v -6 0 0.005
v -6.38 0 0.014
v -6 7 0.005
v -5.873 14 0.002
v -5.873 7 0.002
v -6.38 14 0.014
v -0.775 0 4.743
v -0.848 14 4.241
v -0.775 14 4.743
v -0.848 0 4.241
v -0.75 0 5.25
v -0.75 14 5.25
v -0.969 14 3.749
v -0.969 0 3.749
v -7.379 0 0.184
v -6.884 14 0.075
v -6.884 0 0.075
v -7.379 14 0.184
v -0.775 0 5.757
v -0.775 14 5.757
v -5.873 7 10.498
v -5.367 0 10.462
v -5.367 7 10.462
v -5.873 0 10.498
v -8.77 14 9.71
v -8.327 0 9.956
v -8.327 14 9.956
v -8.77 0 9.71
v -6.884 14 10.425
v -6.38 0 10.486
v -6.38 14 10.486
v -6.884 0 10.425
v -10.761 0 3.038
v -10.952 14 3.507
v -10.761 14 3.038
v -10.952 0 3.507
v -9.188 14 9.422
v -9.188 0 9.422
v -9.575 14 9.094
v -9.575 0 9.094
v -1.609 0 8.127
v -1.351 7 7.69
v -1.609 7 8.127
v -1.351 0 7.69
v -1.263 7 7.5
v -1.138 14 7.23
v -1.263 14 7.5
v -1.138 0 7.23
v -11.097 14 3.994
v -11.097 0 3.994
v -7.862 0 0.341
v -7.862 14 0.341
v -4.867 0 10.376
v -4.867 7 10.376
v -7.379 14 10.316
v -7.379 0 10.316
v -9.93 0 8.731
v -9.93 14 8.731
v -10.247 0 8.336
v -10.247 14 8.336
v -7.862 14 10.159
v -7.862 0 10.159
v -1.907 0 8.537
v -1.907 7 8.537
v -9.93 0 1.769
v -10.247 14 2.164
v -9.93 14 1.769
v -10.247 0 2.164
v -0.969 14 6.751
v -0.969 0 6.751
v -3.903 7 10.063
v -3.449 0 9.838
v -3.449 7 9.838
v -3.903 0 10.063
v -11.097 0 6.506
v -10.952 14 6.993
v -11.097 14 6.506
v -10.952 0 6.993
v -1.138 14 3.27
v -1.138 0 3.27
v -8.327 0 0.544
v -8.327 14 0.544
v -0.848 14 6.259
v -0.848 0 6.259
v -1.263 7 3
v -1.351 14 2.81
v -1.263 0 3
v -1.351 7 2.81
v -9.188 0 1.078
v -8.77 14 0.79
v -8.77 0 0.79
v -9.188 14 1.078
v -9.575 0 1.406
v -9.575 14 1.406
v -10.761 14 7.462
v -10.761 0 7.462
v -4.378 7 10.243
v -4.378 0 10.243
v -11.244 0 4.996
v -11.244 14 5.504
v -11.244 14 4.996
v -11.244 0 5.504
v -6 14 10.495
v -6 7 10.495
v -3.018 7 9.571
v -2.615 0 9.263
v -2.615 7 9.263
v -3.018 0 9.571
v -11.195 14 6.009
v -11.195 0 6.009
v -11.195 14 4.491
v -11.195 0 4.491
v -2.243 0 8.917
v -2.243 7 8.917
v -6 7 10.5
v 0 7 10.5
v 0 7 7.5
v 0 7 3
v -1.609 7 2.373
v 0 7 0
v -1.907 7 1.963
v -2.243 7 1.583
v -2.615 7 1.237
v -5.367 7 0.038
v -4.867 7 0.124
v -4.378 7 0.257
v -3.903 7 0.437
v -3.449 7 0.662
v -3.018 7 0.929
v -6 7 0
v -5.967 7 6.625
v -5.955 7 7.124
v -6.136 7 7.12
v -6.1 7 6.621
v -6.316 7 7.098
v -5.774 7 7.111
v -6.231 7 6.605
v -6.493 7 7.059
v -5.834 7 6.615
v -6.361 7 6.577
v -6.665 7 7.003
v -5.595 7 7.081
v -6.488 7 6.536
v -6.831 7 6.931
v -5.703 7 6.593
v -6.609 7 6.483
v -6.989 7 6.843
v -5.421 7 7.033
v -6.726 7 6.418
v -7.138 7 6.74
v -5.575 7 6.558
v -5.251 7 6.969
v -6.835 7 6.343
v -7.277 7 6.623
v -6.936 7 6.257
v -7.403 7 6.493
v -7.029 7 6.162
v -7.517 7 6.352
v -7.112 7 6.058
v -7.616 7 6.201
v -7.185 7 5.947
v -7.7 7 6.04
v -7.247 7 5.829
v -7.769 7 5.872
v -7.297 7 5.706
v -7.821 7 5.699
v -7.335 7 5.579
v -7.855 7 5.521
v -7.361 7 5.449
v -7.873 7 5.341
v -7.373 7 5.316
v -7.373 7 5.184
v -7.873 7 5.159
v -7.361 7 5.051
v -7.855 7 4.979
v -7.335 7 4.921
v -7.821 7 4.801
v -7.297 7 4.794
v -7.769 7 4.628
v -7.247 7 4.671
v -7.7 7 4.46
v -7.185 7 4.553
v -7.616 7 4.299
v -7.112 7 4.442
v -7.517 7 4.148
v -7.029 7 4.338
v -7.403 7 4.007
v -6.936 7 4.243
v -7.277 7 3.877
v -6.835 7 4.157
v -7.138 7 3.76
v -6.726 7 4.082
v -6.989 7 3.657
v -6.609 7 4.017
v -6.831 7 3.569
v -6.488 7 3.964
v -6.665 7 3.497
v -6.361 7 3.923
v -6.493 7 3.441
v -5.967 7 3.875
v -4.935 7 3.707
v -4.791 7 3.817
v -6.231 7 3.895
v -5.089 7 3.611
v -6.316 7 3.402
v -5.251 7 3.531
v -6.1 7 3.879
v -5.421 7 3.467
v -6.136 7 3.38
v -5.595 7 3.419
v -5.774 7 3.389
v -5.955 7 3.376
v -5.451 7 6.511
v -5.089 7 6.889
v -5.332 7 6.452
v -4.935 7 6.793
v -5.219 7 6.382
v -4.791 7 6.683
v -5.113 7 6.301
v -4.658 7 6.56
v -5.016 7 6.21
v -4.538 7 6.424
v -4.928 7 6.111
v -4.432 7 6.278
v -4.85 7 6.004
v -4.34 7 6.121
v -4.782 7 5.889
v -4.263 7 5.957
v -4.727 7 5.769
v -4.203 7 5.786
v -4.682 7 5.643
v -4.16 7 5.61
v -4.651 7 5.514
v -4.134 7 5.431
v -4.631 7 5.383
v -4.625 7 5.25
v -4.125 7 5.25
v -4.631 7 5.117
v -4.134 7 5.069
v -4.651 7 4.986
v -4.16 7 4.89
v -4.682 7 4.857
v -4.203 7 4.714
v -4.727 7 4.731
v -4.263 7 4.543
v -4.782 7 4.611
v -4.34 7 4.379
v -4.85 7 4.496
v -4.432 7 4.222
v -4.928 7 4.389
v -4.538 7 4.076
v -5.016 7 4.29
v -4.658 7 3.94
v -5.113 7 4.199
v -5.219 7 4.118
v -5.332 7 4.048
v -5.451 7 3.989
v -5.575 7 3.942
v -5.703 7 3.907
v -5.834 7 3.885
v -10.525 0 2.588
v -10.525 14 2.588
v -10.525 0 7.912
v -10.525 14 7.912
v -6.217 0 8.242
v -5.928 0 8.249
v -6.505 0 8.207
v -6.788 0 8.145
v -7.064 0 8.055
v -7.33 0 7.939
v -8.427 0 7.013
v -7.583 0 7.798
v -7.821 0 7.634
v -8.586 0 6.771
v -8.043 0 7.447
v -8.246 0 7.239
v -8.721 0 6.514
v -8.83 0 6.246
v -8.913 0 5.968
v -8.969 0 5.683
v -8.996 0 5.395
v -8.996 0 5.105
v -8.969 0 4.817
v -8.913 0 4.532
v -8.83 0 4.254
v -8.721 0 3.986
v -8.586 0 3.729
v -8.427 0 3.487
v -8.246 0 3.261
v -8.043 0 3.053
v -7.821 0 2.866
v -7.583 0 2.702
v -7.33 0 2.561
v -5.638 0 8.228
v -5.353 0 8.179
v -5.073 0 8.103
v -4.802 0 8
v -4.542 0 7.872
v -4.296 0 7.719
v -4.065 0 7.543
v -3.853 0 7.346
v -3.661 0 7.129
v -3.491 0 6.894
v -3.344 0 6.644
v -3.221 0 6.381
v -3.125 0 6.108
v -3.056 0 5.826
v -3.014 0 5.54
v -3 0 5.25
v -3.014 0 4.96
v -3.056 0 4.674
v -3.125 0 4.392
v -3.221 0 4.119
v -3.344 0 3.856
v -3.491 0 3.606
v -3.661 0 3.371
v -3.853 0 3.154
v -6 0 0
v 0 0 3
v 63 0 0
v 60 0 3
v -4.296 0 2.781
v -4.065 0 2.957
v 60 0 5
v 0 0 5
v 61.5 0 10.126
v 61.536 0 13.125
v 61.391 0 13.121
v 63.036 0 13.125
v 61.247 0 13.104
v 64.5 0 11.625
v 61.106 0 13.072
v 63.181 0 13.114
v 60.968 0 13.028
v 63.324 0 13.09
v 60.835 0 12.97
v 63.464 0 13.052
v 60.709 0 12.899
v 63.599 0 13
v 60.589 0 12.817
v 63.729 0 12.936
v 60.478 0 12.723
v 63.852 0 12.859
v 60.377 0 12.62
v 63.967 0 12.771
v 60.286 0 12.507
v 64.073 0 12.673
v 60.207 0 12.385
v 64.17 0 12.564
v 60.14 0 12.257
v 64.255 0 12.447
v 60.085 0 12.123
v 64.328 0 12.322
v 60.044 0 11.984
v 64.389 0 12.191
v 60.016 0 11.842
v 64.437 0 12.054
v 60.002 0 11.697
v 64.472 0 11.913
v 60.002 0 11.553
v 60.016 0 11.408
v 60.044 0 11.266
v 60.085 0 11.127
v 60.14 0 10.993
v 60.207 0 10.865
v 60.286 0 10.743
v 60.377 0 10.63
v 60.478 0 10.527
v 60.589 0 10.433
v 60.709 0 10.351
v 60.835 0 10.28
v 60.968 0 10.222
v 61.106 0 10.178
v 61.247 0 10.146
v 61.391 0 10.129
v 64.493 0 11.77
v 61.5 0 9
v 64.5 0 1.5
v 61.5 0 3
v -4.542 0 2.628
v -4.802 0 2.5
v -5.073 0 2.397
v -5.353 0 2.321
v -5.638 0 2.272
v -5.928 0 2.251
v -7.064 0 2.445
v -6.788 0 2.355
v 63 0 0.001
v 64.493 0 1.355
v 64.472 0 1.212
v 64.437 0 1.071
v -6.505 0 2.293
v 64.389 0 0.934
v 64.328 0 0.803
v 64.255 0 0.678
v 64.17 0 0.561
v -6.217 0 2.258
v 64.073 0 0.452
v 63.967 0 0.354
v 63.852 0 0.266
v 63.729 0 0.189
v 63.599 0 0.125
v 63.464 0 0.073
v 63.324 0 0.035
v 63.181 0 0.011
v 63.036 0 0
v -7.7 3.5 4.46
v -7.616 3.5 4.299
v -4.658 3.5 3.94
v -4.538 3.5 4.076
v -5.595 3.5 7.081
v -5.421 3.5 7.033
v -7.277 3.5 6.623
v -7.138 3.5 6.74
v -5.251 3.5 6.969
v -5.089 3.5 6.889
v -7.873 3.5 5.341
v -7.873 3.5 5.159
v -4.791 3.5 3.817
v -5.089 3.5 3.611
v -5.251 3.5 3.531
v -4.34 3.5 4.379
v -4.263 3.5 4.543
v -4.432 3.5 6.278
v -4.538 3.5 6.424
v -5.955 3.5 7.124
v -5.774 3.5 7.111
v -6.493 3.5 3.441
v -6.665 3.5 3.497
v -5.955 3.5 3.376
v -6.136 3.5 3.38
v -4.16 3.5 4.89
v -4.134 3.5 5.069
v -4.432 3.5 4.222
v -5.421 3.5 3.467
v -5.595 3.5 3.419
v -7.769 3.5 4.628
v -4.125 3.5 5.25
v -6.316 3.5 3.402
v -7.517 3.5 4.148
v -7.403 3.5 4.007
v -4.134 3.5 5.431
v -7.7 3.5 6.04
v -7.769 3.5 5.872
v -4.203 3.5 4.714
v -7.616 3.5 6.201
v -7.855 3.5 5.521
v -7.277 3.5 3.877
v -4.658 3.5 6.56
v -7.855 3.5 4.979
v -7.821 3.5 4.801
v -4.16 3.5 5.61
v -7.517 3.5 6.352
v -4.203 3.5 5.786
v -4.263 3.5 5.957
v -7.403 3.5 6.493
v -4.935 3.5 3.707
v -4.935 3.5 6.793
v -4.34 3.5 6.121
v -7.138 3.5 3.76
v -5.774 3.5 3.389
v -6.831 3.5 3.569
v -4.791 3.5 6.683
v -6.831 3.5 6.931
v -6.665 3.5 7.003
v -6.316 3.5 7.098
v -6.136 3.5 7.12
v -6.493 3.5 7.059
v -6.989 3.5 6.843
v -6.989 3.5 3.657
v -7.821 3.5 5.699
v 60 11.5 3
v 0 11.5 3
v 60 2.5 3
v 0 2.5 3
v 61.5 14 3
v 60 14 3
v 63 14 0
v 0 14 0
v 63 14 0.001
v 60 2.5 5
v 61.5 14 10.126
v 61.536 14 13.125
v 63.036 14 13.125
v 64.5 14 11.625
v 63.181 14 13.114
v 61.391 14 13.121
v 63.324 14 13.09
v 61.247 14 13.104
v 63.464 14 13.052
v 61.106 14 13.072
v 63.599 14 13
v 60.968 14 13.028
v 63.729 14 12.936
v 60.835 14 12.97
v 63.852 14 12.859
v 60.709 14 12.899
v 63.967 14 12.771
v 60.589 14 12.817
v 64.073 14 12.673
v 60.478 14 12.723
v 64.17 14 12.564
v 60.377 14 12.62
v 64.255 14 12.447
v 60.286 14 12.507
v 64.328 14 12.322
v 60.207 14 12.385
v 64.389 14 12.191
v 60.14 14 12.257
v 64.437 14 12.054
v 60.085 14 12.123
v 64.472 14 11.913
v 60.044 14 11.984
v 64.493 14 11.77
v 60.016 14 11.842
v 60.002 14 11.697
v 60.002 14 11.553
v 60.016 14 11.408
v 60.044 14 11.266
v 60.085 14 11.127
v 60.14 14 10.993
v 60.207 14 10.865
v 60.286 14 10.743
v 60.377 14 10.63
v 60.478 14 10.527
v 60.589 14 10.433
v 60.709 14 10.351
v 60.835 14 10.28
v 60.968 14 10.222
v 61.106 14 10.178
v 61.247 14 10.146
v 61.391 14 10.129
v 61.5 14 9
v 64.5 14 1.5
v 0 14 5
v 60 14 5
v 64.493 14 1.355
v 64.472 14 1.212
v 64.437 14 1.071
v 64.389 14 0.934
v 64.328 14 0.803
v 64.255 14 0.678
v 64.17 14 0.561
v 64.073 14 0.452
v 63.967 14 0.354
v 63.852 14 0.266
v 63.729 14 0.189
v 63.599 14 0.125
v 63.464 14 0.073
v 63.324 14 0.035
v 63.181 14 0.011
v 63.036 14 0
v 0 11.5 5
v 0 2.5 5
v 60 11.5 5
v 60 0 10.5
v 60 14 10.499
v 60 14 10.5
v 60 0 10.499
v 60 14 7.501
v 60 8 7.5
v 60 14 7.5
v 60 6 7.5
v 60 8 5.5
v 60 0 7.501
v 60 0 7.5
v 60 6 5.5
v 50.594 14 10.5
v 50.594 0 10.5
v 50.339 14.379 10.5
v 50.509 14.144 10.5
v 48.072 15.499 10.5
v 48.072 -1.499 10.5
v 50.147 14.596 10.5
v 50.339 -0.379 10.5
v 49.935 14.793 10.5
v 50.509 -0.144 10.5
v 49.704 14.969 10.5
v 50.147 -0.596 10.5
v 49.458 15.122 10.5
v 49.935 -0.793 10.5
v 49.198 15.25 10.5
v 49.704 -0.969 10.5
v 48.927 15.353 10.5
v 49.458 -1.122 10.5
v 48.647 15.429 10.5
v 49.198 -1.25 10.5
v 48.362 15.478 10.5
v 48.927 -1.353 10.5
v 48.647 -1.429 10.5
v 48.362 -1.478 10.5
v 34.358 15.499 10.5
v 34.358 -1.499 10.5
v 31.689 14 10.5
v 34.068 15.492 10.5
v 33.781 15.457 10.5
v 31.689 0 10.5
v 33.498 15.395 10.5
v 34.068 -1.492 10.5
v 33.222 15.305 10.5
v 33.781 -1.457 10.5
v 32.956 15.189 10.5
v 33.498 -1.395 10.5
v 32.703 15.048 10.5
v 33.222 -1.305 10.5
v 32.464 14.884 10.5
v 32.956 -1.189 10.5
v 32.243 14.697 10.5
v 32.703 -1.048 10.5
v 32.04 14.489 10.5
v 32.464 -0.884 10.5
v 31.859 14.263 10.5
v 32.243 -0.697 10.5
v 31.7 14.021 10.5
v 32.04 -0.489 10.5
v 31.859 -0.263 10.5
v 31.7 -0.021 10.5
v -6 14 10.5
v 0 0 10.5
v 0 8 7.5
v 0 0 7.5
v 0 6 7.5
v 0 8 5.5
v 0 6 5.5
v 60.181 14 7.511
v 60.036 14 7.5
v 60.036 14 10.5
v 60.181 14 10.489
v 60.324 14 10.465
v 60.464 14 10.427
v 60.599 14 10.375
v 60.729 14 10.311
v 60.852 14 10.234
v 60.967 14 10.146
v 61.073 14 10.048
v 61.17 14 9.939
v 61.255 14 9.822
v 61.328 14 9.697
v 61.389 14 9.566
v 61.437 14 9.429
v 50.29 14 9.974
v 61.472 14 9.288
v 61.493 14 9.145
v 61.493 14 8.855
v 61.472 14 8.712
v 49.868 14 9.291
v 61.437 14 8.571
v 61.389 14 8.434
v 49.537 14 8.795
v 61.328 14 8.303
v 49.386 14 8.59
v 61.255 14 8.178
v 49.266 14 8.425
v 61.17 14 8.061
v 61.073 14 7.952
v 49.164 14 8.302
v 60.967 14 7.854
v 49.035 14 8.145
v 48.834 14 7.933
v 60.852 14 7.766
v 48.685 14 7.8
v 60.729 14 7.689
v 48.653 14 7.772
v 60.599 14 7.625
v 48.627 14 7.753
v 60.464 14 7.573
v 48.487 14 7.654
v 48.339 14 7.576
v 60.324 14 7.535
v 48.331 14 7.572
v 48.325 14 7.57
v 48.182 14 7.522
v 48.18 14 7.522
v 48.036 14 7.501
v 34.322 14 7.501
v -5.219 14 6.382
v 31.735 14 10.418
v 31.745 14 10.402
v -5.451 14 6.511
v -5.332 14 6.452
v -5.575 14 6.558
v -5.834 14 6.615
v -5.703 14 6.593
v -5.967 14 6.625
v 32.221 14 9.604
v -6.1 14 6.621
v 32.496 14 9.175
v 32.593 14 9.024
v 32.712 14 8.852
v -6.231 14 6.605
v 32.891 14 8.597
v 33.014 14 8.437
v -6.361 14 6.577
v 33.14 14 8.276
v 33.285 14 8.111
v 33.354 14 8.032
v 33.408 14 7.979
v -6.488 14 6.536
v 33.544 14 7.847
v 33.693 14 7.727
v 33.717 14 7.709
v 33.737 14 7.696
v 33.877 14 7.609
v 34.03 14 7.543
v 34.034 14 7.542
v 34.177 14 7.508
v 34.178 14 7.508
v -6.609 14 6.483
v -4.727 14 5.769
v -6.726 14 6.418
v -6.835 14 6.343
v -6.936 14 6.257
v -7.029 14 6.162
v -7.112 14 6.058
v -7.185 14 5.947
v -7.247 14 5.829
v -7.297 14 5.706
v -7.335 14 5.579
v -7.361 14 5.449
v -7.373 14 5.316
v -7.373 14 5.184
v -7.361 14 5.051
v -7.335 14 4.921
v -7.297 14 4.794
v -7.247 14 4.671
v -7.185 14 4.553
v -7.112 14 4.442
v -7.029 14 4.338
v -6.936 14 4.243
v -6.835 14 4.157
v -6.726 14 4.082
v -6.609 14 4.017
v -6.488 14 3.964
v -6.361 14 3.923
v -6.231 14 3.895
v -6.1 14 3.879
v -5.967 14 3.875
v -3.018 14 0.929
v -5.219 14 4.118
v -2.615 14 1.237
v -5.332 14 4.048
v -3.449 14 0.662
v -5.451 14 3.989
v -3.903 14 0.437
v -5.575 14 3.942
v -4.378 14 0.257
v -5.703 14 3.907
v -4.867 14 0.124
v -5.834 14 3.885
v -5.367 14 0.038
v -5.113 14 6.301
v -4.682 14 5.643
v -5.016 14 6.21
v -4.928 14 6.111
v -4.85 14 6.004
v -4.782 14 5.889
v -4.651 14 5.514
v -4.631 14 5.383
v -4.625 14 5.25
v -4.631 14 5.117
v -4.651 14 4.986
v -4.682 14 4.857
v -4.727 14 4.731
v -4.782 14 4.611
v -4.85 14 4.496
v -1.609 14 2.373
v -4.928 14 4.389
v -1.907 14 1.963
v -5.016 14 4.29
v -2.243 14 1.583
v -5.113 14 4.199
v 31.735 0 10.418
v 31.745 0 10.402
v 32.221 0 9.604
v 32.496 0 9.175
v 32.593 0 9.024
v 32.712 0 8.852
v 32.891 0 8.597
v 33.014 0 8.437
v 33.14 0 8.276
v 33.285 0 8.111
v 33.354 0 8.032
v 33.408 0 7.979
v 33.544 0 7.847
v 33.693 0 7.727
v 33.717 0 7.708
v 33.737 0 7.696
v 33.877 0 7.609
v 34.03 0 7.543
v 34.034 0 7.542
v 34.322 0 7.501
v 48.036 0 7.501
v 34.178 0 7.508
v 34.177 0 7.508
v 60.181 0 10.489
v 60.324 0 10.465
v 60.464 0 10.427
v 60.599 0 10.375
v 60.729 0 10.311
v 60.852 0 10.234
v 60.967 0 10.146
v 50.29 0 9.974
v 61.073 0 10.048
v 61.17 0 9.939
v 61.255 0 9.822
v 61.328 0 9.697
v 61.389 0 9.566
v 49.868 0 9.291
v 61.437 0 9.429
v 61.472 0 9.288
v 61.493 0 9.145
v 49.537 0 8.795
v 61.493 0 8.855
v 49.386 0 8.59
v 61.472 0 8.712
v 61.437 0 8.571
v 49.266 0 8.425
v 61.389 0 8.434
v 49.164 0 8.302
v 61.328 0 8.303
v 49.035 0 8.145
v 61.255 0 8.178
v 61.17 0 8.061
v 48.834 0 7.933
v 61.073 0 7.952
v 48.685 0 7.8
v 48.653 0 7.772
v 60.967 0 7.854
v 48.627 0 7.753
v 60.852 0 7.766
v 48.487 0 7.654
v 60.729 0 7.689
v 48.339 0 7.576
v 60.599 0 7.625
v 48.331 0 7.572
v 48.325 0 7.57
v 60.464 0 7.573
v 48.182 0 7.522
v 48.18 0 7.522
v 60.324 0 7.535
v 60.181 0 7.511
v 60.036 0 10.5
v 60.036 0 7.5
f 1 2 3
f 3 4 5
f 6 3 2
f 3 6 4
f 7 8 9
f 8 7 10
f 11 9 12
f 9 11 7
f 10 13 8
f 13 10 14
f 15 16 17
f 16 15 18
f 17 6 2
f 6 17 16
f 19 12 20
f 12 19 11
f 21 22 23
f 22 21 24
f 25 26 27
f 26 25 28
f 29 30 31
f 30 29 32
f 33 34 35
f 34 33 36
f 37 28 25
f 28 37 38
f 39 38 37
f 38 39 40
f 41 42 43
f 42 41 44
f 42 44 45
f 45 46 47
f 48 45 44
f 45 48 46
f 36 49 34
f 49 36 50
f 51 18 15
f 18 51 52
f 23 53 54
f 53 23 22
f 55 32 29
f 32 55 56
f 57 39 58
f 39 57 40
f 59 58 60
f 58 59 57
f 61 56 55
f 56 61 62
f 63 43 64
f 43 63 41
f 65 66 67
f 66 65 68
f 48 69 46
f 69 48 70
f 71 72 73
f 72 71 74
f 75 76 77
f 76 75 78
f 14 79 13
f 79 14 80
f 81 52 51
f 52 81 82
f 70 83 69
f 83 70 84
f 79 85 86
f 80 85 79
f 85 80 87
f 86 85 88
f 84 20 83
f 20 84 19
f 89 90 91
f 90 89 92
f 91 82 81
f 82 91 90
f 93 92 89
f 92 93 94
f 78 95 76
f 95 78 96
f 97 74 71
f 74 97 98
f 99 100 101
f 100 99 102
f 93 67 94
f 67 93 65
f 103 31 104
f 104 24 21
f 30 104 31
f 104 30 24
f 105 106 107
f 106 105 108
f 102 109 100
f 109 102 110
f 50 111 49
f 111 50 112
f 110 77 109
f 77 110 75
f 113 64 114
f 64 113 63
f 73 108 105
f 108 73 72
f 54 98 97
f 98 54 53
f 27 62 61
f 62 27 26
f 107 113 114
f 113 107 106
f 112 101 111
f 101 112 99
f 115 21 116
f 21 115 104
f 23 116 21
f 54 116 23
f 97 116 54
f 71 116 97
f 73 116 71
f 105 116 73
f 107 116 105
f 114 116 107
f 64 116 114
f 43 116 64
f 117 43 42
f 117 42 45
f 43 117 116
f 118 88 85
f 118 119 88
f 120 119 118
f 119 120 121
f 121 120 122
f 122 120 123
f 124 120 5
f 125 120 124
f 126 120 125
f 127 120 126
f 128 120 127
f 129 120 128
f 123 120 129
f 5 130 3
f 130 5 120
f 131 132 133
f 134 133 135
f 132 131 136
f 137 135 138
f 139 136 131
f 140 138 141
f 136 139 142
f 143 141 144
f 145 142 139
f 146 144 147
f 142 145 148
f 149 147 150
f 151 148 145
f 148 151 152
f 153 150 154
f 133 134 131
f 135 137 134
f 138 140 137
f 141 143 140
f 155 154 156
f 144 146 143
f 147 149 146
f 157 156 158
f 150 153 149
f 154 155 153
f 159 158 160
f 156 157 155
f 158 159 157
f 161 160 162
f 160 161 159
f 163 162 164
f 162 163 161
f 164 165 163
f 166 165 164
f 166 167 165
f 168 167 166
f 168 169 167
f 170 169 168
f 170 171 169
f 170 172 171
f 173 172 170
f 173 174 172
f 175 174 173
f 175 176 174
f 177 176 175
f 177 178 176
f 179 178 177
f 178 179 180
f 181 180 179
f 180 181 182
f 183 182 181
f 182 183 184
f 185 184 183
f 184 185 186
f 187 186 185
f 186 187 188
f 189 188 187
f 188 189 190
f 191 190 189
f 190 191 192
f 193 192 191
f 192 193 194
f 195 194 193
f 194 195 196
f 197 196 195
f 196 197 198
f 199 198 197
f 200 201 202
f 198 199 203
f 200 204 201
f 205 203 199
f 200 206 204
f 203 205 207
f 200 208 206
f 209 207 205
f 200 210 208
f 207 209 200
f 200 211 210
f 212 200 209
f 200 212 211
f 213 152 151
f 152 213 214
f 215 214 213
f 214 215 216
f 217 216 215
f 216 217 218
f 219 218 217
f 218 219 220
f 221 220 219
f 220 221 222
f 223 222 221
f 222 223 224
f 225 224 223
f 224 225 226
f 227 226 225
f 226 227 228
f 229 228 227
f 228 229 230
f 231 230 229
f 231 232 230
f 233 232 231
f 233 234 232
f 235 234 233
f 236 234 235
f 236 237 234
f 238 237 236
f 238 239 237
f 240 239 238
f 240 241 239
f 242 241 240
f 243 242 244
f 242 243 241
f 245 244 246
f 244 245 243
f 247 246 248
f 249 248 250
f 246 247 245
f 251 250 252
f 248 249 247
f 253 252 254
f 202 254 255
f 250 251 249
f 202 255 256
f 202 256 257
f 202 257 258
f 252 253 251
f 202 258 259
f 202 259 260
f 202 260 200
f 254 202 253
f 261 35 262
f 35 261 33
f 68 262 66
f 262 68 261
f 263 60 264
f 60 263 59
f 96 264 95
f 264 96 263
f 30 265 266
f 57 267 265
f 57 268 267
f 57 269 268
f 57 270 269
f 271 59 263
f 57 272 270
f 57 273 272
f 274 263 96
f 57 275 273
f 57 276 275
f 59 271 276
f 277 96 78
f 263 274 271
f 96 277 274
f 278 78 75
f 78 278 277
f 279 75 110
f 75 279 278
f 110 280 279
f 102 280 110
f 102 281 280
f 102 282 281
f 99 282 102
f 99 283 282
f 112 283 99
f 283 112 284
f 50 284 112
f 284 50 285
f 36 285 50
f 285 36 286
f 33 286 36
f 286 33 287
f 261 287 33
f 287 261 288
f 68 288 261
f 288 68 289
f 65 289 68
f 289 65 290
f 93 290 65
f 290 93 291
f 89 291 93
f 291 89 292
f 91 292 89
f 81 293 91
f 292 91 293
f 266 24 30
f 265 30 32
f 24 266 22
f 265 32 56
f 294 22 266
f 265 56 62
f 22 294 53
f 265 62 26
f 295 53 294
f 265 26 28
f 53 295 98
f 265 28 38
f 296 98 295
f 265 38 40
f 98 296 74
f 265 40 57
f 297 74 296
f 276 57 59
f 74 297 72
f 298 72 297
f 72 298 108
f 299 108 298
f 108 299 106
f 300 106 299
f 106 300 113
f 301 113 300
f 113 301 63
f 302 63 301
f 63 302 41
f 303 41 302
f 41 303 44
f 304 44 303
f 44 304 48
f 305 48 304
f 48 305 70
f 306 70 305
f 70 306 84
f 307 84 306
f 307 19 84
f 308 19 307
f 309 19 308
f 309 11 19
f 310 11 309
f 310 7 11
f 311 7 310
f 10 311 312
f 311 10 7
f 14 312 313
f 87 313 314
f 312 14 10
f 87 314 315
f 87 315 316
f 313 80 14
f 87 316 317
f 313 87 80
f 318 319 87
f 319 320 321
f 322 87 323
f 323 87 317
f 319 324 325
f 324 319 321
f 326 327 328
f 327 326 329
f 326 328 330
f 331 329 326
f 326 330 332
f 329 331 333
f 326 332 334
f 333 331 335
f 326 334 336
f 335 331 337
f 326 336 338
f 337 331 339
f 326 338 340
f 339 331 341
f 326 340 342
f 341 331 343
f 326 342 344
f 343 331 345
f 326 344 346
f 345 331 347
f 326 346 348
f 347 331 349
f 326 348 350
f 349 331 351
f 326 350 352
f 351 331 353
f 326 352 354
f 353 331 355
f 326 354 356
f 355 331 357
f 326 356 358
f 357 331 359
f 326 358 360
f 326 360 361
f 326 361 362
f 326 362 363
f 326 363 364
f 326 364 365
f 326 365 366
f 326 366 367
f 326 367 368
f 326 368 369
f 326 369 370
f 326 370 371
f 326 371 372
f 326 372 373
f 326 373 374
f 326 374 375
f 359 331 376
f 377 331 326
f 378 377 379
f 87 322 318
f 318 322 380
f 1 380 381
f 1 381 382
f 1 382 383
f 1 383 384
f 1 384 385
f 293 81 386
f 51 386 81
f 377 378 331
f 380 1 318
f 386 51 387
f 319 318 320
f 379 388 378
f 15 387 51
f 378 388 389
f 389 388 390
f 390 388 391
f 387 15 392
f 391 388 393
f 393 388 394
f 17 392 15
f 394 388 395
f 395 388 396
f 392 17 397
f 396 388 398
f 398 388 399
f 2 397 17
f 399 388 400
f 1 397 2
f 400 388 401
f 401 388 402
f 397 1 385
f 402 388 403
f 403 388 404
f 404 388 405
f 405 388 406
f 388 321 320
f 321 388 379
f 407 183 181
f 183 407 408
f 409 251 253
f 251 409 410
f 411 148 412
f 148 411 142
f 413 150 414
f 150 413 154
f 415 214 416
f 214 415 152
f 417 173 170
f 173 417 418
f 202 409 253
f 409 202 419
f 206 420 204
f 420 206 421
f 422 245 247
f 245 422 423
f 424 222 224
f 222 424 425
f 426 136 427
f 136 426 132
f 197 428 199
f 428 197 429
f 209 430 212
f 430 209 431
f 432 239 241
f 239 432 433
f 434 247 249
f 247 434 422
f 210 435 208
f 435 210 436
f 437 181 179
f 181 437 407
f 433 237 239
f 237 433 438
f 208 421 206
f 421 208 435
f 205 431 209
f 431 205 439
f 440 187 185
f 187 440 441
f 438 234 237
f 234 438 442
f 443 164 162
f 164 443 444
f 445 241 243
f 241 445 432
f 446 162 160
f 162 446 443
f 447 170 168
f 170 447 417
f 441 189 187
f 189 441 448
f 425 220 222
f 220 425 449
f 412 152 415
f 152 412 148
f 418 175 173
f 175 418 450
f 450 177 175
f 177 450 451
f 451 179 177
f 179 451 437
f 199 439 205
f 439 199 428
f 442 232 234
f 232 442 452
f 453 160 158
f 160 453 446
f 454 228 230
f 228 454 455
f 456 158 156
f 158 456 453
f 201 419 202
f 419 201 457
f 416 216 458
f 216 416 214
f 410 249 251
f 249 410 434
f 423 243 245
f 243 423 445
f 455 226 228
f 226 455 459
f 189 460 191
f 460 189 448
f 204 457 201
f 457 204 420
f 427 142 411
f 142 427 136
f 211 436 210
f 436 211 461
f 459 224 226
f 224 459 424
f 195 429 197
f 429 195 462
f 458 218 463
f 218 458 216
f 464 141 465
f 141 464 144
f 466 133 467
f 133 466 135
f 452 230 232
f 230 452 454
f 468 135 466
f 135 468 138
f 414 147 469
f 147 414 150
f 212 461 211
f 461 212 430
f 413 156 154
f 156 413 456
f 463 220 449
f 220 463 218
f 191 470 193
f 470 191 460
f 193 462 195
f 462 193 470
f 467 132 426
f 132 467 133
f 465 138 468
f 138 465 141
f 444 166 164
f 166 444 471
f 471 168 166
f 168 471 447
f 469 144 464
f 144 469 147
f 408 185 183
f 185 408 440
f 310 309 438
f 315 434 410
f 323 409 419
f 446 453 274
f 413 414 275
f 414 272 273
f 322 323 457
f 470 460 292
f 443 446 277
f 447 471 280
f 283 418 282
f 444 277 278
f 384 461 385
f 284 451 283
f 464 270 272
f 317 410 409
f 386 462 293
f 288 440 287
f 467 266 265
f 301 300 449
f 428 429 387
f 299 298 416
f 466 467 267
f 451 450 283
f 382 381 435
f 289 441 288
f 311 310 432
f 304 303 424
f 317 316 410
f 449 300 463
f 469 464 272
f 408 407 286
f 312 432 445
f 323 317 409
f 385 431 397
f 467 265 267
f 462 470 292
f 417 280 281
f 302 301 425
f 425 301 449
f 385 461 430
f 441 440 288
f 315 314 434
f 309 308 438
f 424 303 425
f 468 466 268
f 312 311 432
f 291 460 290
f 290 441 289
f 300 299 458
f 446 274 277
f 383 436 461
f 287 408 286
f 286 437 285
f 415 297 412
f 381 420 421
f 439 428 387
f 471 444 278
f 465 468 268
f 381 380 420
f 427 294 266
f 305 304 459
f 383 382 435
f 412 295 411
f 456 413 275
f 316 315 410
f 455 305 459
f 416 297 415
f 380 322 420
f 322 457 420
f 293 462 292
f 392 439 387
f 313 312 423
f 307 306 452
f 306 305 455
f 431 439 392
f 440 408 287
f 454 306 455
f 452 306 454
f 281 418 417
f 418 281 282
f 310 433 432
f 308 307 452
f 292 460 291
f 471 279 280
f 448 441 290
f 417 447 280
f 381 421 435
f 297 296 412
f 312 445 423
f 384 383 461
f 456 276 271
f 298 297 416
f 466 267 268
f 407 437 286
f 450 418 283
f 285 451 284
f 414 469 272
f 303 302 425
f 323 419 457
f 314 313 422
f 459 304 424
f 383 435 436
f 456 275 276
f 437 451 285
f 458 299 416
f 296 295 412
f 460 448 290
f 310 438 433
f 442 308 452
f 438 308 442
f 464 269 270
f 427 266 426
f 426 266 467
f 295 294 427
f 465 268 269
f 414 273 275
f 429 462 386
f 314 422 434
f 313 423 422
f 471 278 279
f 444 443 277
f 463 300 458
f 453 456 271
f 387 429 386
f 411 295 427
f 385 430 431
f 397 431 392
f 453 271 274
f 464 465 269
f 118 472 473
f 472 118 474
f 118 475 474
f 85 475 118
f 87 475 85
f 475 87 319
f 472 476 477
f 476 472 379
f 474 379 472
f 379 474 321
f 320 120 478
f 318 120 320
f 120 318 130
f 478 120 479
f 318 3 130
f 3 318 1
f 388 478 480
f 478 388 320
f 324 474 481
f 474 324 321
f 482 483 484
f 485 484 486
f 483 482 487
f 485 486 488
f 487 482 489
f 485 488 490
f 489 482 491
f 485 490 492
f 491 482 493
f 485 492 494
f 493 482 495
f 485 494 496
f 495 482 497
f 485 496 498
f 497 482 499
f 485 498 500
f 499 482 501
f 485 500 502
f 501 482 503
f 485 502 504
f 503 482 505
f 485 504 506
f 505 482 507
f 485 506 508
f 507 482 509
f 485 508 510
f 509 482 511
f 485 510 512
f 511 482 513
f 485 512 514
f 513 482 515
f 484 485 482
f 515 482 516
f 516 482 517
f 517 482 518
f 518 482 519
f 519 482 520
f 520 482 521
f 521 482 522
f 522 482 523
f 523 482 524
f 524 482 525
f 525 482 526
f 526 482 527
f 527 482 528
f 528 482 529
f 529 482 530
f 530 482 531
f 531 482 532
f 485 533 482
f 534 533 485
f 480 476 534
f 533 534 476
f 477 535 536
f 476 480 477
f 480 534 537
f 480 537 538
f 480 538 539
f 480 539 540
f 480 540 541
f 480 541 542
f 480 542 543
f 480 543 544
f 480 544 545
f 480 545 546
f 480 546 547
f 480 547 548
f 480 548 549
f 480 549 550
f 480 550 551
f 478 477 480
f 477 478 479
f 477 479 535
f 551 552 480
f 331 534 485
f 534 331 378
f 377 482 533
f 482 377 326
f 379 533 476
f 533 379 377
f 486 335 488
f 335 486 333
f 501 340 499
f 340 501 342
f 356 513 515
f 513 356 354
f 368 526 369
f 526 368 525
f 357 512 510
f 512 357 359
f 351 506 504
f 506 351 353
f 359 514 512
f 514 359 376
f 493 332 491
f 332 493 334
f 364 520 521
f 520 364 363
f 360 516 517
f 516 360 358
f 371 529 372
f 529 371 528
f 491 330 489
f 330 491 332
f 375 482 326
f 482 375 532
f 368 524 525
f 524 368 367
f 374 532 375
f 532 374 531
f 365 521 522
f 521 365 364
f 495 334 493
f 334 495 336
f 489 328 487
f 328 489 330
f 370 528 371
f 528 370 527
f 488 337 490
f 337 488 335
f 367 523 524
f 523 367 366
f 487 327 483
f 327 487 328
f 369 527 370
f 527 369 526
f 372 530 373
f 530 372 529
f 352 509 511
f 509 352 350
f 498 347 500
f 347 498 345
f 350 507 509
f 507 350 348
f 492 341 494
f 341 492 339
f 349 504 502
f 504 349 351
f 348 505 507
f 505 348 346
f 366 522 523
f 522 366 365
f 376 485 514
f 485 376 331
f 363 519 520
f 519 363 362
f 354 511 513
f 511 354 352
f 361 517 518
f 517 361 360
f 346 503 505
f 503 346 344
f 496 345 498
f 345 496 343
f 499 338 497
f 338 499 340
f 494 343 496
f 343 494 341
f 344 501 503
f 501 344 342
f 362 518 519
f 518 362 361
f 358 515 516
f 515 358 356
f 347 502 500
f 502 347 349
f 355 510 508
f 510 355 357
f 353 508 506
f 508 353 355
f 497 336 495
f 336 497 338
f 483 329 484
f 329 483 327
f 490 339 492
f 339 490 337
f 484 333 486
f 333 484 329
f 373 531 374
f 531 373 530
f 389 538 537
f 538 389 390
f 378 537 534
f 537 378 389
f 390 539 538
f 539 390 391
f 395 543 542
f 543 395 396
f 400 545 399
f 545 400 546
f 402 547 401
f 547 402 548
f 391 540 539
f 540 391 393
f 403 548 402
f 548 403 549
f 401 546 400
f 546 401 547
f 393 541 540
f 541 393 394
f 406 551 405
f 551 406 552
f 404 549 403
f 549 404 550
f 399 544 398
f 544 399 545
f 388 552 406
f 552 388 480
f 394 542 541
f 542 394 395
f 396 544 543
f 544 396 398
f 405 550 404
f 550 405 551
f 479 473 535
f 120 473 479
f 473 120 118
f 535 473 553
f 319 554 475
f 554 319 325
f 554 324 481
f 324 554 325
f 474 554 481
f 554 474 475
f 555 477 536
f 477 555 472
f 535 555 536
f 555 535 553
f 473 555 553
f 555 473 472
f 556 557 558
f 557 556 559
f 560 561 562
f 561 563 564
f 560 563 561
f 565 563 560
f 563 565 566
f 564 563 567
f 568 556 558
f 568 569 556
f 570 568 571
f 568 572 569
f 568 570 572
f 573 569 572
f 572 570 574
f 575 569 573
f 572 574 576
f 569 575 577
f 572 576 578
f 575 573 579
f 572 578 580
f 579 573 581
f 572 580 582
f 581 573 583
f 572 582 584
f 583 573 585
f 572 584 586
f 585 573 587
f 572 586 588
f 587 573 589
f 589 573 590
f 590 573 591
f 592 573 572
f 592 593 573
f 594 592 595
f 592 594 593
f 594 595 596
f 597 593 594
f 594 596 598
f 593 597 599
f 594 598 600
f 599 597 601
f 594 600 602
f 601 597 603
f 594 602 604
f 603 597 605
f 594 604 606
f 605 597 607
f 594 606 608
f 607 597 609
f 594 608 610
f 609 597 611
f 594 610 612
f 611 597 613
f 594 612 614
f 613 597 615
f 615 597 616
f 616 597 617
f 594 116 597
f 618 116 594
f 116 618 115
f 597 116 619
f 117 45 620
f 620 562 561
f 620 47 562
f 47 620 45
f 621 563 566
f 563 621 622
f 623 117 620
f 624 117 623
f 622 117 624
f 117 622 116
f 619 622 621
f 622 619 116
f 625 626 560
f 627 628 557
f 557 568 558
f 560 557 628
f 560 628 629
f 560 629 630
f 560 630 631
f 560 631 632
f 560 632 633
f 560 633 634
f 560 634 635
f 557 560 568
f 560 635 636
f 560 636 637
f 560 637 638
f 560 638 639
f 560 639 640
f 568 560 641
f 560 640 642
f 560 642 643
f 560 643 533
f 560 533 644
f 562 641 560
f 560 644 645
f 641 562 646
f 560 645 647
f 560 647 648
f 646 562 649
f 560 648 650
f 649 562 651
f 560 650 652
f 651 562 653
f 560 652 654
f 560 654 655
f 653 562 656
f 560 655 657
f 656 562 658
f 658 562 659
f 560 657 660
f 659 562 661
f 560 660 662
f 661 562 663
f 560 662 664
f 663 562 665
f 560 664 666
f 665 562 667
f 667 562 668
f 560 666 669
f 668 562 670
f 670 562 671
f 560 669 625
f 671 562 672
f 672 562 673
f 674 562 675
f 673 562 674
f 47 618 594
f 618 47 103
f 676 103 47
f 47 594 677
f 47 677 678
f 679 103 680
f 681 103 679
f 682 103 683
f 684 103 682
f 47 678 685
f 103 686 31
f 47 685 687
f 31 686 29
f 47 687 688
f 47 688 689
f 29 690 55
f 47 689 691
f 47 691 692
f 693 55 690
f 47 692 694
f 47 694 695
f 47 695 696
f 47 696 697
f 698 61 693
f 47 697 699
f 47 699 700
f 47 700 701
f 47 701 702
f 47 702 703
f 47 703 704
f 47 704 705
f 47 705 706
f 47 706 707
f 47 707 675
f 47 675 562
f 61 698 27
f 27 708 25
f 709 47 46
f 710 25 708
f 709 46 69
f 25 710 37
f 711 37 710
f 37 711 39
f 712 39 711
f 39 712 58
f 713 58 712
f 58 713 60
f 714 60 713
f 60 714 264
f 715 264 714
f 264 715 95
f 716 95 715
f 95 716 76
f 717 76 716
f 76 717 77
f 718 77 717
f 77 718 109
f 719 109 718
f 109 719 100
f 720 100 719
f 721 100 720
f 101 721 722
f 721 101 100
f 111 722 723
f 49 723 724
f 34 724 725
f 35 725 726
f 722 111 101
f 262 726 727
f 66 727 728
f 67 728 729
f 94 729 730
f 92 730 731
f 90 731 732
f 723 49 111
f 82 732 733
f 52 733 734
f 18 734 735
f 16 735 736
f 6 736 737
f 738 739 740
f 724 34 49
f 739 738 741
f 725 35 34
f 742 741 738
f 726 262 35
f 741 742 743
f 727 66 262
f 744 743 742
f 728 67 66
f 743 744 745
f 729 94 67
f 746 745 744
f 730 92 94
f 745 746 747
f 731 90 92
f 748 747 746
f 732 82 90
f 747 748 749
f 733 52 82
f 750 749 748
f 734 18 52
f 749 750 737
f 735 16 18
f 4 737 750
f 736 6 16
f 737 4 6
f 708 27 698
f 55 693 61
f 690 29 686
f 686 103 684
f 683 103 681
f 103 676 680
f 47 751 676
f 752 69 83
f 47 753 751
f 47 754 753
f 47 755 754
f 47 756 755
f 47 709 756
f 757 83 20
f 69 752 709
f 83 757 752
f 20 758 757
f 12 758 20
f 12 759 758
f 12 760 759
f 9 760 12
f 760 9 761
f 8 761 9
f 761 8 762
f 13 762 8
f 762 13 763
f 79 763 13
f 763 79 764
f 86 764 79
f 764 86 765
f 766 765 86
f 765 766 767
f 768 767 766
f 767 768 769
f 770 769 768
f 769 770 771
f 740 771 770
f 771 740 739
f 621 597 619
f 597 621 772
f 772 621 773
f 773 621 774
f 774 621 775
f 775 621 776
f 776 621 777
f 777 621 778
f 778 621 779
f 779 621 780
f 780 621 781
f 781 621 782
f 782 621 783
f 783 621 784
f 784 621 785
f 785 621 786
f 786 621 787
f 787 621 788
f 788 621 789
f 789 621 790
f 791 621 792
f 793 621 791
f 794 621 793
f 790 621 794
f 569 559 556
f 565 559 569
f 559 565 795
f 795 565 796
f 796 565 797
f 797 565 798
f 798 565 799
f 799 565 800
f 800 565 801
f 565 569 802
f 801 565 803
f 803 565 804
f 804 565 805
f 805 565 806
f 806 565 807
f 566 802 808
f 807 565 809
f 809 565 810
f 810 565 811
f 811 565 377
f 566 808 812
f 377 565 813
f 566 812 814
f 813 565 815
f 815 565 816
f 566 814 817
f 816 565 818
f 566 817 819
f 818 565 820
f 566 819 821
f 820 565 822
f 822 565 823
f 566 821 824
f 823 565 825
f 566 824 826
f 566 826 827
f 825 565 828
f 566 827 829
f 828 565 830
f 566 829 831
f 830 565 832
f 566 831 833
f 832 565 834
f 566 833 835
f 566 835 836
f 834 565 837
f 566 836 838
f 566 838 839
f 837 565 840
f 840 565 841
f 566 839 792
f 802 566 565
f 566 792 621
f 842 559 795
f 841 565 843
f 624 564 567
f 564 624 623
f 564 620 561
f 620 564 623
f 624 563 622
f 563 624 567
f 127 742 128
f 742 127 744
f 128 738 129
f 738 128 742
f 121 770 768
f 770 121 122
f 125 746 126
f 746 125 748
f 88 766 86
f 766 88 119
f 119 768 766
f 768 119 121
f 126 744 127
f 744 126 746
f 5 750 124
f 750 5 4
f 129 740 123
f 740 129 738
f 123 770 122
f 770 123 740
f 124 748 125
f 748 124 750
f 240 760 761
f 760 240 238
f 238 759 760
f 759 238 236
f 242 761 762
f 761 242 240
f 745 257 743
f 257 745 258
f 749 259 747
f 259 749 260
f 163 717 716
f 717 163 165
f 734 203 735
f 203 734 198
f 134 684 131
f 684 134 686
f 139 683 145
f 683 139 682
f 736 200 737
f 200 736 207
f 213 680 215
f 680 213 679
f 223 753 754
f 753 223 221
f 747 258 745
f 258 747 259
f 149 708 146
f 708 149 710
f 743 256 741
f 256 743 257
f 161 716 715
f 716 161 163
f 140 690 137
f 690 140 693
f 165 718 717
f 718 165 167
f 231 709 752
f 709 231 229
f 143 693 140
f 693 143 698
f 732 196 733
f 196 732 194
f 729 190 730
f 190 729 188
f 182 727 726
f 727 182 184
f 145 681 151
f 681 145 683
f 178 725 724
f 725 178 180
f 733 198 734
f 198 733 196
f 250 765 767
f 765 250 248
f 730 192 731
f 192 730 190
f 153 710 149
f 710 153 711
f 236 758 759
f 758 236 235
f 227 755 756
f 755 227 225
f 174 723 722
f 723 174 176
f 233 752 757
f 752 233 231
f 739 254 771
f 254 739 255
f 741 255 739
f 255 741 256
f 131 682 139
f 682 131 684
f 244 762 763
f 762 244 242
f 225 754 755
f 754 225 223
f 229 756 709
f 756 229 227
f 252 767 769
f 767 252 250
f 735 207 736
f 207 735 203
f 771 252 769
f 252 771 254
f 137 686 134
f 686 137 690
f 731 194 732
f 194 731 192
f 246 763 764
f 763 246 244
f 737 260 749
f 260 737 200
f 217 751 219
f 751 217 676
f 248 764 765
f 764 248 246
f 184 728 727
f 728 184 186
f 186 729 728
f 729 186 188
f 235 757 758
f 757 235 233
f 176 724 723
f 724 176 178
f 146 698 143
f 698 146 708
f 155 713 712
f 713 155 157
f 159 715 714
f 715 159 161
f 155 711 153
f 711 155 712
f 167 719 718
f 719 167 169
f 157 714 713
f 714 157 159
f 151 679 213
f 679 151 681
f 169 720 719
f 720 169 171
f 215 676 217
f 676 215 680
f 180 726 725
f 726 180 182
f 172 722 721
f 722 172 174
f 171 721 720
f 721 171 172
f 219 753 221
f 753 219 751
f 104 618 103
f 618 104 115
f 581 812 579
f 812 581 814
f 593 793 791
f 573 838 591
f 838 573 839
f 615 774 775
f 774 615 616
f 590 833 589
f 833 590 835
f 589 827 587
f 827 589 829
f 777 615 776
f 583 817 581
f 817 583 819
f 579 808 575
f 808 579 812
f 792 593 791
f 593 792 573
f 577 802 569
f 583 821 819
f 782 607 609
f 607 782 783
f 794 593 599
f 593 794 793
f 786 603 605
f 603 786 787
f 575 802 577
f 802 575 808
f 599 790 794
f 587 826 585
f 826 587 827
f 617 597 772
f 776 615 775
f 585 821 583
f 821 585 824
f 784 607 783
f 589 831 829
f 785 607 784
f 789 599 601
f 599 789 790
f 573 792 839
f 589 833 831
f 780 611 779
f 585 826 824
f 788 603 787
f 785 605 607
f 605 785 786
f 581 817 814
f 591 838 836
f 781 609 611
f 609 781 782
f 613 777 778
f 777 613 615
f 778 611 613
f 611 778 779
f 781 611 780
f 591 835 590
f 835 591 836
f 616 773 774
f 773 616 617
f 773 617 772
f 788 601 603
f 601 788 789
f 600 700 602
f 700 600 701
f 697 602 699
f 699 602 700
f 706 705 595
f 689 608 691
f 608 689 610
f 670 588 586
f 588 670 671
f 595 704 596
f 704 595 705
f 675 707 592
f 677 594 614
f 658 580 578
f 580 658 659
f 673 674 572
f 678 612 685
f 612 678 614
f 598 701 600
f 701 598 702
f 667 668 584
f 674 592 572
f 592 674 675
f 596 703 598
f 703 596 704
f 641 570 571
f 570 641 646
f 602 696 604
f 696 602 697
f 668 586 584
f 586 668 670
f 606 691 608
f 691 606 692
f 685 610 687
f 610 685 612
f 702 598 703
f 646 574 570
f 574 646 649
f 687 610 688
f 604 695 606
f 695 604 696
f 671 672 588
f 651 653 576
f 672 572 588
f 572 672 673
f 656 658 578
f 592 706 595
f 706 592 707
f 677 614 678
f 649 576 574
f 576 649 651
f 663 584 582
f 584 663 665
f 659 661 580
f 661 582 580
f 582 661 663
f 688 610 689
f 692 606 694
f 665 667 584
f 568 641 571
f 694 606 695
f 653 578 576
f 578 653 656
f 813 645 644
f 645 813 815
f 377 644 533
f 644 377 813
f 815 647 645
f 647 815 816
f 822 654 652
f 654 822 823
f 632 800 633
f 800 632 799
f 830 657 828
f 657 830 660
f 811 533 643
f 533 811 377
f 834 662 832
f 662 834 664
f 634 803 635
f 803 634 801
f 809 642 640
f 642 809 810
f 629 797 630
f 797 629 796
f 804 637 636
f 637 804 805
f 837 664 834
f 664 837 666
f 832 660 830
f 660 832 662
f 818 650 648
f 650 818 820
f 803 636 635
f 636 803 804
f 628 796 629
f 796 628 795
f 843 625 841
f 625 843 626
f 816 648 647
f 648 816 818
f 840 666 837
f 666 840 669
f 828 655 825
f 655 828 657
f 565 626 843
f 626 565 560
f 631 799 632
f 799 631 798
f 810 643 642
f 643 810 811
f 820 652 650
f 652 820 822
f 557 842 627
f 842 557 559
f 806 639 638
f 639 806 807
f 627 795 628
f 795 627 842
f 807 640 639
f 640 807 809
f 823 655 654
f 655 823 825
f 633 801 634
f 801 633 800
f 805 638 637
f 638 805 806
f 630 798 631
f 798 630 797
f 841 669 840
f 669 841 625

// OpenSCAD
//BY DOWNLOADING, OPENING AND/OR USING THIS WORK YOU AGREE TO THE TERMS AND CONDITIONS CONTAINED AT THE END OF THIS FILE.

resolution = 65; //[20:Low, 65:Medium, 200:High]

//Length of the clamping face for the clip.
length=60;

//Width of the clip.
width=14; //12.75

//Width of the clamping studs.
studwidth=2.5;

//Height of the clamping studs.
studheight=2;

//Thickness of clamp arms.
thickness=3;

//Sealing gap.
gap=2.5; //0.4

//Screw hole size for hinge.
hole=3.75;

//Countersinking.
screwtop=6;

//Clip thread for screw.
thread=2.75;

//Hand grips. Makes opening clips easier.
grip=1; //[0:No Grip, 1:Grip]

//Spliting for printing. 0=All, 1=Base, 2=Top.
display=0; //[0:All, 1:Base, 2:Top]

$fn=resolution;

lift=0;

if (display==0||display==1) {
translate([length,0,0]) cube([thickness,width,thickness]);

translate([length+thickness/2,0,thickness/2]) cube([thickness,width,thickness*1.875+studheight+gap]);

hull() {
translate([length+thickness/2,0,thickness*2.375+studheight+gap]) rotate([-90,0,0]) cylinder(width,thickness/2,thickness/2);
    
translate([length+thickness,0,thickness*2.375+studheight+gap]) rotate([-90,0,0]) cylinder(width,thickness/2,thickness/2);
}

translate([length+thickness,0,thickness/2]) rotate([-90,0,0]) cylinder(width,thickness/2,thickness/2);

//base//
cube([length,width,thickness]);

//base studs
translate([0,0,0]) cube([length,studwidth,thickness+studheight]);
translate([0,width-studwidth,0]) cube([length,studwidth,thickness+studheight]);

//hindge cylinder base
translate([-thickness*2,0,thickness+studheight/2+gap/2]) rotate([-90,0,0]) {
difference() {
cylinder(width/2,thickness+studheight/2+gap/2,thickness+studheight/2+gap/2);
cylinder(width,hole/2,hole/2);
cylinder(width/4,screwtop/2,hole/2);
}
}

//hinge bridge
translate([-thickness*2,0,0]) {
difference() {
cube([width,width/2,thickness]);
translate([0,0,thickness+studheight/2+gap/2]) rotate([-90,0,0])
cylinder(width/2,thickness+studheight/2,thickness+studheight/2);
}
}
}

if (display==0||display==2) {
//top//
translate([0,0,thickness+studheight+gap+lift]) {
cube([length,width,thickness]);

//top stud
translate([0,width/4+gap,-studheight]) 
cube([length,width/2-gap*2,thickness+studheight]);
}


//hindge cylinder top
translate([-thickness*2,width/2,thickness+studheight/2+gap/2+lift]) rotate([-90,0,0]) {
difference() {    
cylinder(width/2,thickness+studheight/2+gap/2,thickness+studheight/2+gap/2);
cylinder(width,thread/2,thread/2);
}
}
   
//hinge bridge
translate([-thickness*2,width/2,0]) {
difference() {
translate([0,0,thickness+studheight+gap+lift]) cube([width,width/2,thickness]);
translate([0,0,thickness+studheight/2+gap/2+lift]) rotate([-90,0,0])    cylinder(width/2,thickness+studheight/2,thickness+studheight/2);
}
}

translate([length,0,thickness*1.5+studheight+gap+lift]) rotate([-90,0,0]) cylinder(width,thickness/2,thickness/2);

if (grip==1) {
hull() {
translate([length/1.75,thickness/2,thickness+studheight+gap+lift]) cylinder(thickness,thickness/2,thickness);
translate([length/1.25,thickness/2,thickness+studheight+gap+lift]) cylinder(thickness,thickness/2,thickness);
}

hull() {
translate([length/1.75,width-thickness/2,thickness+studheight+gap+lift]) cylinder(thickness,thickness/2,thickness);
translate([length/1.25,width-thickness/2,thickness+studheight+gap+lift]) cylinder(thickness,thickness/2,thickness);
}
}
}

//License Conditions 

//Rights: 
//Save and privately distribute modified copies for the sole purpose of convenience, provided the license remains included and unmodified. 
//Use this design in a commercial setting provided it is on a single case basis. 
//Review the code and values for learning purposes. 
//Display this design in a public setting provided the appropriate attributions are included and clearly visible. 

//Conditions (without prior written permission): 
//Sell, gain profit from or relicense this design in any format or by any means, commercially or otherwise. 
//Directly copy sections of code for any other project or design. 
//Publicly redistribute or host this file. 
//The design owner can revoke all rights at any time, including all use, for any reason. Sorry.
